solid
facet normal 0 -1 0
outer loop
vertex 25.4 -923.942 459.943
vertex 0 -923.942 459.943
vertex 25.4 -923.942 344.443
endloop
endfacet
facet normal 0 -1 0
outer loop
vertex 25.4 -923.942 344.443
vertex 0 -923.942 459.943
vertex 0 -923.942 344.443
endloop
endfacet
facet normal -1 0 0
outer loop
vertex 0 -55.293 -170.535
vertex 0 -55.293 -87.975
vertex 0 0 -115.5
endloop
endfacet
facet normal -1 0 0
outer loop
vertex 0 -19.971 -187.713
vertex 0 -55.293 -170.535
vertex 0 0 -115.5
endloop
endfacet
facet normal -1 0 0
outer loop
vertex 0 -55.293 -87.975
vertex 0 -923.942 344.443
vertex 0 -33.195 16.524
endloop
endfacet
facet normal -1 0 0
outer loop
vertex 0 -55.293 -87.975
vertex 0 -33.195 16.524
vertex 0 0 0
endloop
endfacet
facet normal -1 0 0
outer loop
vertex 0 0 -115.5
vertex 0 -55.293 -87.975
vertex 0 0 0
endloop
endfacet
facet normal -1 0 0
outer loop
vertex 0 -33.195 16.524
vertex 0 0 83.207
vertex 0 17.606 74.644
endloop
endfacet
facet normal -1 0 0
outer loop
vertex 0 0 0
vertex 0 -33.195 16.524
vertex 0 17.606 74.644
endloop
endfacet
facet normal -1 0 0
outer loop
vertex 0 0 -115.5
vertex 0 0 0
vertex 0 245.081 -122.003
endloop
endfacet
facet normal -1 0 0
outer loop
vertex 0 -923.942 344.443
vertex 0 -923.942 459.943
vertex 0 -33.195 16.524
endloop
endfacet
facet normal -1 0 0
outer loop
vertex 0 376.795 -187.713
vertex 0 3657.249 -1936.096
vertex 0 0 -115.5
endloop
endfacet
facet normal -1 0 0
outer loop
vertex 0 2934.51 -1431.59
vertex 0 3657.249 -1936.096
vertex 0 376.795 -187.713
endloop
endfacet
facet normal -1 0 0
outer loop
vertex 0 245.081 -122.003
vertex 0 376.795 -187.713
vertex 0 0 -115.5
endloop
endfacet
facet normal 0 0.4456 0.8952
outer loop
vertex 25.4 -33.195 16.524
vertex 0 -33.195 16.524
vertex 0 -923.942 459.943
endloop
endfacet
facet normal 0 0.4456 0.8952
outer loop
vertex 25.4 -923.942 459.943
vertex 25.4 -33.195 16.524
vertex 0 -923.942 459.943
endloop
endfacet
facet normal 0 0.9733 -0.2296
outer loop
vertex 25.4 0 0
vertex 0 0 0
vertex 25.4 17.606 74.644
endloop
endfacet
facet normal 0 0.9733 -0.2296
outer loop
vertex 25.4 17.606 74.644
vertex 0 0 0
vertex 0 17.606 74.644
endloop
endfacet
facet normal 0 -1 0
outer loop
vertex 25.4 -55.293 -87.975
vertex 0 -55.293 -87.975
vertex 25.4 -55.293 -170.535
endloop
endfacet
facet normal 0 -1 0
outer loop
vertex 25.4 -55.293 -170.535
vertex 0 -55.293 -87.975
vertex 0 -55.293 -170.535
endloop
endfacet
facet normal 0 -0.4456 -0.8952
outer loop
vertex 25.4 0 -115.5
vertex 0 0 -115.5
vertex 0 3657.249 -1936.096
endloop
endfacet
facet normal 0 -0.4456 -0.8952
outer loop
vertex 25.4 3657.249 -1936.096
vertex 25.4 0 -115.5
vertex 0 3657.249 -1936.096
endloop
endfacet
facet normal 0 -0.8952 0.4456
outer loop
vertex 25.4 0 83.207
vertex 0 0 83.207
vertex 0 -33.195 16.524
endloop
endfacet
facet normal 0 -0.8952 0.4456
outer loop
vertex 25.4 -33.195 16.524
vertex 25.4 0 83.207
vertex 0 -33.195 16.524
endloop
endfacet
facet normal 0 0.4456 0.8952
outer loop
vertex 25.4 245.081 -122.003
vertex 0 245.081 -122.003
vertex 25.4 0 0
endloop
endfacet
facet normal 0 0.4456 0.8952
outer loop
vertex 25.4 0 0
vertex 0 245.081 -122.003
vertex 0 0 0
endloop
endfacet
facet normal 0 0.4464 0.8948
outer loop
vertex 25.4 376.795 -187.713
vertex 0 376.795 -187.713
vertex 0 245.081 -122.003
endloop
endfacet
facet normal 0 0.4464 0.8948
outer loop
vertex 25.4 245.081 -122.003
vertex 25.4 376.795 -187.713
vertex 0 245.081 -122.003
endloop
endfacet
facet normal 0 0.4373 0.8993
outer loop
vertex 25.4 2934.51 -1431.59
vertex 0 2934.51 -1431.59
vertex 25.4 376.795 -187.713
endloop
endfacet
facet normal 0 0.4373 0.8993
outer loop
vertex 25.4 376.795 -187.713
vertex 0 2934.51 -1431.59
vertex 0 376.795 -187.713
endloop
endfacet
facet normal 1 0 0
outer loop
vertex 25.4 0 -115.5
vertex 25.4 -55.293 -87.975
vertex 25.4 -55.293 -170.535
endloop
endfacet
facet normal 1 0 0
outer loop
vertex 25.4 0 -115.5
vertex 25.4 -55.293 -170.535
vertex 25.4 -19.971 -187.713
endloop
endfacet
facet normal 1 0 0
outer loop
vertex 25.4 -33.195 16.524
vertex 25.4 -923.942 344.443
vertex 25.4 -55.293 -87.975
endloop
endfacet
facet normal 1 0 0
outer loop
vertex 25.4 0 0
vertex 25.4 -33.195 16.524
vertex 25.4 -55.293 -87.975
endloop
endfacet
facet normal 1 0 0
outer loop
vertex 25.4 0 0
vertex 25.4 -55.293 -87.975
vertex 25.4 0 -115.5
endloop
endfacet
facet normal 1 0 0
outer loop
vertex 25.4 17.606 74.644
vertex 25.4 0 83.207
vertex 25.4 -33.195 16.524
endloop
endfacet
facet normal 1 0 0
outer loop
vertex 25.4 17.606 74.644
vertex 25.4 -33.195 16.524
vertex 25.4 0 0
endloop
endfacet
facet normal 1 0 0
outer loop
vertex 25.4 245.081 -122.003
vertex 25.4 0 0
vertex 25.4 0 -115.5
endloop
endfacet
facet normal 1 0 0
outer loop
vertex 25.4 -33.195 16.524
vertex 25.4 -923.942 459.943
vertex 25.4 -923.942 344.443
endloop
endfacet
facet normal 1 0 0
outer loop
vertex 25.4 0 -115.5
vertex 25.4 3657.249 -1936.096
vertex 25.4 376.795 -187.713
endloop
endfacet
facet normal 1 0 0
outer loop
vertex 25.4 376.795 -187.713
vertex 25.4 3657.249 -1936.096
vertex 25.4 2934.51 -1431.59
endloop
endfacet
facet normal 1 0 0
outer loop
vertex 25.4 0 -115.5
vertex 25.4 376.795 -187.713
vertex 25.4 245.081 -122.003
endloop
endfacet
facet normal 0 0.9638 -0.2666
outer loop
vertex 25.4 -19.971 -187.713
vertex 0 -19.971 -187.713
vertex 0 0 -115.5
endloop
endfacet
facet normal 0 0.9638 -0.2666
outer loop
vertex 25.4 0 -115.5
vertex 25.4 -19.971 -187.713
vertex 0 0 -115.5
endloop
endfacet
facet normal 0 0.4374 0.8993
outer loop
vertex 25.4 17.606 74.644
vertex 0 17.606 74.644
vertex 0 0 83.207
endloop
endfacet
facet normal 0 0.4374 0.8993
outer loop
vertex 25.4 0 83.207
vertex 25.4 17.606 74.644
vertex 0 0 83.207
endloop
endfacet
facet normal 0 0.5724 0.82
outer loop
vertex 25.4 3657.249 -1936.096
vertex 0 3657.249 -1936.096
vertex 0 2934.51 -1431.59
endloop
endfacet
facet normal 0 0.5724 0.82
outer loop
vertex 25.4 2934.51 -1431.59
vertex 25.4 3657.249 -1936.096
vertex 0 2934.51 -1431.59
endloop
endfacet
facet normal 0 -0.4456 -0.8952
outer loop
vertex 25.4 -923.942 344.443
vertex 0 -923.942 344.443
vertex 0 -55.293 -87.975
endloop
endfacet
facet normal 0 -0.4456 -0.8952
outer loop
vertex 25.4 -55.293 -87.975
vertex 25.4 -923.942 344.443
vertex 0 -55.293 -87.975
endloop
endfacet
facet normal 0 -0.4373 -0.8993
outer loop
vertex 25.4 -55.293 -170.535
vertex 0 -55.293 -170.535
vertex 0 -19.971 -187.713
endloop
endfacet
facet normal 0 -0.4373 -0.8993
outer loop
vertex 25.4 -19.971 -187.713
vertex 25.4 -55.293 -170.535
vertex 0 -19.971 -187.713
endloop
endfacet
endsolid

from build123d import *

# Parameters (mm, degrees)
F1_DEPTH = 25.4


with BuildPart() as f1:
    # F0 (on Right) → F1 (new body)
    with BuildSketch(Plane.YZ):
        Polygon((245.0814843178, -122.0027208328), (0, 0), (0, -115.5001354055), (3657.2494506836, -1936.0961914062), (2934.5104694366, -1431.5899610519), (376.7951726913, -187.7133101225), align=None)
        Polygon((0, -115.5001354055), (0, 0), (-33.1946770807, 16.524467086), (-54.0016578511, -81.8672191593), align=None)
        Polygon((-33.1946770807, 16.524467086), (0, 0), (17.6064074039, 74.6441856027), (0, 83.2065924915), align=None)
        Polygon((-55.293253218, -87.9748927089), (0, -115.5001354055), (-54.0016578511, -81.8672191593), align=None)
        Polygon((-19.9713829201, -187.7133101225), (0, -115.5001354055), (-55.293253218, -87.9748927089), (-55.293253218, -170.5354601145), align=None)
        Polygon((-54.0016578511, -81.8672191593), (-33.1946770807, 16.524467086), (-923.9424188991, 459.9429014898), align=None)
        Polygon((-55.293253218, -87.9748927089), (-54.0016578511, -81.8672191593), (-923.9424188991, 459.9429014898), (-923.9424188991, 344.4427660843), align=None)
    extrude(amount=F1_DEPTH)


solid = f1.part
